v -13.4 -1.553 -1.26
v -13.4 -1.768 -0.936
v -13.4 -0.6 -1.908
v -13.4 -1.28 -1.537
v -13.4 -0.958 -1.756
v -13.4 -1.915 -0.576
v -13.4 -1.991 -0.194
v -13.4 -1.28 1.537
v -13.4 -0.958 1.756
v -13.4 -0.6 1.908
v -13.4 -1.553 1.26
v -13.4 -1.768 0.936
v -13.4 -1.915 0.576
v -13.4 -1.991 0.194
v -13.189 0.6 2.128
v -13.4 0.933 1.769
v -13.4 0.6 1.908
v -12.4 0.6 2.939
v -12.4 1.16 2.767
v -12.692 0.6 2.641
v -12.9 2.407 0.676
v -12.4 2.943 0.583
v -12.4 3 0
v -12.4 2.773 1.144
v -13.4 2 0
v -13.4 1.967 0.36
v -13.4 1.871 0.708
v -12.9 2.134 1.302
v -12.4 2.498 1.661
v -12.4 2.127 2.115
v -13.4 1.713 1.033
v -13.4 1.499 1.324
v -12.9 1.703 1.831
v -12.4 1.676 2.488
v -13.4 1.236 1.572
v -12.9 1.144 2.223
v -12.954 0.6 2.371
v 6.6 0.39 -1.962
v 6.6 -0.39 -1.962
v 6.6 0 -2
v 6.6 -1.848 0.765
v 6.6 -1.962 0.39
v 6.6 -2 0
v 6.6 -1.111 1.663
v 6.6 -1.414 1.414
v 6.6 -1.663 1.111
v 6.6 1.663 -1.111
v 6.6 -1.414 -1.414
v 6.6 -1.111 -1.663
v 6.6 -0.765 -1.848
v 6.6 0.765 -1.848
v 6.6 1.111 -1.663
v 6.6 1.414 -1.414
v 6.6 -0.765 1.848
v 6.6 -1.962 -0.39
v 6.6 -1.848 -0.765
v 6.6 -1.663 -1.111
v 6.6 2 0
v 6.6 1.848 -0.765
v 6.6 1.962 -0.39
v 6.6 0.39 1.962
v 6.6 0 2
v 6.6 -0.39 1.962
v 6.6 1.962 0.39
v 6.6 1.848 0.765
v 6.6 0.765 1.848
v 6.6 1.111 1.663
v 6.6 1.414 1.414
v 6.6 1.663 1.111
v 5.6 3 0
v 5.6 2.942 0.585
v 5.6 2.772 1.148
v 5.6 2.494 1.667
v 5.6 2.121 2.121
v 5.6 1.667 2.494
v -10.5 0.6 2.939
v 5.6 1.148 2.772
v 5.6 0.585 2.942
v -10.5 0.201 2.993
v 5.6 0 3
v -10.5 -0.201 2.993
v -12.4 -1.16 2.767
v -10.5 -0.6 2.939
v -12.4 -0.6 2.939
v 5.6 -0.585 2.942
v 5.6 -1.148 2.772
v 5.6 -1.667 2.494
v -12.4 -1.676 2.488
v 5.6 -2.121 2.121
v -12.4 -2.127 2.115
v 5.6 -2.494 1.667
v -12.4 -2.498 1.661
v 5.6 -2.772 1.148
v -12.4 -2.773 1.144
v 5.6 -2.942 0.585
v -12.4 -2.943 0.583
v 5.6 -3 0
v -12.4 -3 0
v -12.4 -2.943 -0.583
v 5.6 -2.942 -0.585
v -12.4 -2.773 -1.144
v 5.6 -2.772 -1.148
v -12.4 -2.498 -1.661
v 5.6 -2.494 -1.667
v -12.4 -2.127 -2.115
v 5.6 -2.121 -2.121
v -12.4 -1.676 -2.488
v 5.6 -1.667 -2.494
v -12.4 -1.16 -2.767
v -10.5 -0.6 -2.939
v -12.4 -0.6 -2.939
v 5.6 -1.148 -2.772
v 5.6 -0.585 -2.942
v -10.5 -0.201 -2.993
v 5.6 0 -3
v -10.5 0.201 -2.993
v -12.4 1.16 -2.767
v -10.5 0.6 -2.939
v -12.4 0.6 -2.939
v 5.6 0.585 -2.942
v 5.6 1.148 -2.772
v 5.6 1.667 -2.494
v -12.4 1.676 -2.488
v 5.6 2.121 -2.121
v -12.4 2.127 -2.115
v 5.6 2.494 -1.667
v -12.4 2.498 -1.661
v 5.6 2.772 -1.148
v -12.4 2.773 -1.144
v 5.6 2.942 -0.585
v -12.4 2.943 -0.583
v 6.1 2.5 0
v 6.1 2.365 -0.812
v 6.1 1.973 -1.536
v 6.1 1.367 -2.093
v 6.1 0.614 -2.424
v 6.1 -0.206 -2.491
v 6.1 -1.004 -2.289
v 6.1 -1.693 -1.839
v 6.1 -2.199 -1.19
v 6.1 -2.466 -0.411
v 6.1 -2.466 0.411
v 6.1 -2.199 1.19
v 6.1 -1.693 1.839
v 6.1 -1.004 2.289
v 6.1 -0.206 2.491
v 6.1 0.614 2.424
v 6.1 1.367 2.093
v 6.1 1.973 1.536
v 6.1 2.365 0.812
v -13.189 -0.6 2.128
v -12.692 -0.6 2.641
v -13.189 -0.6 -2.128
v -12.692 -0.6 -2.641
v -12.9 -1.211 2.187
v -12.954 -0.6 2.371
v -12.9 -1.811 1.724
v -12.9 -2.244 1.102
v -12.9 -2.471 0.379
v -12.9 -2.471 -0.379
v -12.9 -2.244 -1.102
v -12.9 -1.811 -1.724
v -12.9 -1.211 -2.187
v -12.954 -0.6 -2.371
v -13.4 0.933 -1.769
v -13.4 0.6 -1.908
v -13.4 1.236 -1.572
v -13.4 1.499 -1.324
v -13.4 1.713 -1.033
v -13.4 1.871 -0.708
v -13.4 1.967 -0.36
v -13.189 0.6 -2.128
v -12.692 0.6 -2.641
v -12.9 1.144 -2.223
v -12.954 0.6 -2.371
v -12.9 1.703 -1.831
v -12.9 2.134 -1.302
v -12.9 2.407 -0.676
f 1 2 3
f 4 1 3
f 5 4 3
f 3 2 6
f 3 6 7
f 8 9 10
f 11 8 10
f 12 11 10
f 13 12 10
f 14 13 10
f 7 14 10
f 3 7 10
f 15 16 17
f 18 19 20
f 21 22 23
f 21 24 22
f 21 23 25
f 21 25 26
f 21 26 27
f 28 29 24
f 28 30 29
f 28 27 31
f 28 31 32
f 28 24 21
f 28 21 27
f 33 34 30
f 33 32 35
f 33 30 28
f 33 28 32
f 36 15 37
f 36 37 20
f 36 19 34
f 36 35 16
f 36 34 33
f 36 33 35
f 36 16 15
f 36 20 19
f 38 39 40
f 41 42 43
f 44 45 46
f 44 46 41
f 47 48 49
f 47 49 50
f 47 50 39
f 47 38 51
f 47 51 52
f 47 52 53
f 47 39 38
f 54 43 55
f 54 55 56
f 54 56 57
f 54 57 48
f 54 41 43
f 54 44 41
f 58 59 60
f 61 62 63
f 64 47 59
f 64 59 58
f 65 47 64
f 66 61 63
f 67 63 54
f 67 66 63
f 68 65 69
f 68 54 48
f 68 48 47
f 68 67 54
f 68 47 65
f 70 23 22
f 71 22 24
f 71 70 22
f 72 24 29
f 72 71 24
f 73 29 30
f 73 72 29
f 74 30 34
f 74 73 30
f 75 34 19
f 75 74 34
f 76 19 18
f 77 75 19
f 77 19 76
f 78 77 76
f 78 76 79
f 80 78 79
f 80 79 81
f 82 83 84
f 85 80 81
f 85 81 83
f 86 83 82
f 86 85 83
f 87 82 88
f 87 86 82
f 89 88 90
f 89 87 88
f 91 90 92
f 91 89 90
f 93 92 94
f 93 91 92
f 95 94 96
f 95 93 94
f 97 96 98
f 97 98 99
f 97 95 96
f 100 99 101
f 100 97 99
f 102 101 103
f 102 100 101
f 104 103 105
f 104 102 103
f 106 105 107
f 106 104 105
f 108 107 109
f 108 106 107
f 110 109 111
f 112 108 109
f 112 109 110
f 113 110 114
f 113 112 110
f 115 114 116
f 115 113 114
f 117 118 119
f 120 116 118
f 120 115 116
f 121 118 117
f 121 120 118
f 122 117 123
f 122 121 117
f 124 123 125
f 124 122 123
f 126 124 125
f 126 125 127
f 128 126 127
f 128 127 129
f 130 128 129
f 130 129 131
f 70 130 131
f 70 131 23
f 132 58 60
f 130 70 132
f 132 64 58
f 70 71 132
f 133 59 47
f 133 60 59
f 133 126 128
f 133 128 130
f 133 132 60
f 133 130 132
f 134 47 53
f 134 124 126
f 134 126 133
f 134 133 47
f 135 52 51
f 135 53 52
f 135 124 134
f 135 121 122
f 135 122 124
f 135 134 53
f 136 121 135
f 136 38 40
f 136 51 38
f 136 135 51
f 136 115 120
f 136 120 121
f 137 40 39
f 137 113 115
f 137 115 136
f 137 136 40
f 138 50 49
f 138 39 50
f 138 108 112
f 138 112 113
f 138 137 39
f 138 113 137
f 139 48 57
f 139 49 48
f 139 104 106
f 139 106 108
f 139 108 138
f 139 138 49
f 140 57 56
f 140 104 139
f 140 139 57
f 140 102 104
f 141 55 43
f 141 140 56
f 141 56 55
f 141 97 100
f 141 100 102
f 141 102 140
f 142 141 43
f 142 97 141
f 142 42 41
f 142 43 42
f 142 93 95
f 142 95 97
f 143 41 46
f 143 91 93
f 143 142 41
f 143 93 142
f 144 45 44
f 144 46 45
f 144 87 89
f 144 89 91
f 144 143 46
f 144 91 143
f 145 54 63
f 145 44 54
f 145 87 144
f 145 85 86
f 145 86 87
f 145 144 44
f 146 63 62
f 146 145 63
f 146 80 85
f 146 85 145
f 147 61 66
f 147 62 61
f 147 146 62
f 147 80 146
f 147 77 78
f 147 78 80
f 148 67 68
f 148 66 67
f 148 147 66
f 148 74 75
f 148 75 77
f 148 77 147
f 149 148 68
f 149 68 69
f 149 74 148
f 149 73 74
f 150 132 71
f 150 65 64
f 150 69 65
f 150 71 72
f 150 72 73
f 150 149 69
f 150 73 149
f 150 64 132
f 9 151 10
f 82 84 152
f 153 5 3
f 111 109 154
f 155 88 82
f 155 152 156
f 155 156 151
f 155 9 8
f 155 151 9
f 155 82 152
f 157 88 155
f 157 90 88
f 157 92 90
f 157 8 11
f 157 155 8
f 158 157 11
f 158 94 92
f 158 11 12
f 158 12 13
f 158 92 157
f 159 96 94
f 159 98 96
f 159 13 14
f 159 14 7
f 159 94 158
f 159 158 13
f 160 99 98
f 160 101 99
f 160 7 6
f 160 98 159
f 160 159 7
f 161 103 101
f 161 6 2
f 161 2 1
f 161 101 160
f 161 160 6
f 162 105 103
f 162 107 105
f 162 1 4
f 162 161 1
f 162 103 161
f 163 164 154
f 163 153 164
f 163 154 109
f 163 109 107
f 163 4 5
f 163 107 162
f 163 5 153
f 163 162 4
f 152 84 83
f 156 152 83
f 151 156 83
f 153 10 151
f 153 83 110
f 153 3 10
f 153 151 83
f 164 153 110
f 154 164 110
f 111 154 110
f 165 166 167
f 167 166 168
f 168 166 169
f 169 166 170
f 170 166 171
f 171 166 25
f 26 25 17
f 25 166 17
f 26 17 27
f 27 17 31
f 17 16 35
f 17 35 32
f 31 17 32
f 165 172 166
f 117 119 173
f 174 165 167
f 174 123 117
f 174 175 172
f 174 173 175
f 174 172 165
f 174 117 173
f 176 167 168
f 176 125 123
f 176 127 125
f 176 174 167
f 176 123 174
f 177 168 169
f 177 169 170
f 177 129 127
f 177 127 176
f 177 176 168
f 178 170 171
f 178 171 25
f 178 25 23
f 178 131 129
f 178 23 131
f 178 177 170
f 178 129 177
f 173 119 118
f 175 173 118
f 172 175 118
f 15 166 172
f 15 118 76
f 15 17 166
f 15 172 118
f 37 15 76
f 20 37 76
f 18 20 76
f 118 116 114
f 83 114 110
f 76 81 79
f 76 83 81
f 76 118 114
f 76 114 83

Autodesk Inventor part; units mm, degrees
ref_plane "YZ Plane" through (0, 0, 0) normal (1, 0, 0) x (0, 1, 0)
ref_plane "XZ Plane" through (0, 0, 0) normal (0, 1, 0) x (-1, 0, 0)
sketch "Sketch1" plane through (0, 0, 0) normal (0, 0, 1) x (1, 0, 0)
  line L0 (0, 6.25) -> (0, -4.9479) construction
  line L1 (-13.4, 0) -> (-13.4, 3)
  line L2 (-13.4, 3) -> (6.6, 3)
  line L3 (6.6, 3) -> (6.6, 0)
  line L4 (-13.4, 0) -> (6.6, 0)
  line L5 (-17.4, 0) -> (10.6, 0) projected
  line L6 (0, 8.4896) -> (0, -7.1875) projected
  dimension "d0" = 6
  dimension "d1" = 6.6
  dimension "d2" = 20
revolve "Body" add sketch "Sketch1" angle 360 about axis through (-13.4, 0, 0) along (1, 0, 0)
sketch "Sketch2" plane through (-13.4, 0, 0) normal (-1, 0, 0) x (0, 0, 1)
  line L0 (0, -4.2) -> (0, 4.2) projected
  line L1 (-4.2, 0) -> (4.2, 0) projected
  line L2 (-3, 0.6) -> (3, 0.6)
  line L3 (3, 0.6) -> (3, -0.6)
  line L4 (3, -0.6) -> (-3, -0.6)
  line L5 (-3, -0.6) -> (-3, 0.6)
  line L6 (-3, 0) -> (3, 0) construction
  line L7 (0, 0.6) -> (0, -0.6) construction
  circle A0 centre (0, 0) radius 3 projected
  dimension "d10" = 1.2
extrude "Slot" cut sketch "Sketch2" against normal blind 2.9 contours L4 A0 L1 L0 | L0 L1 A0 L4 | L4 L5 A0 | A0 L3 L4 | L1 A0 L2 L0 | L0 L2 A0 L1 | L5 L2 A0 | A0 L2 L3
chamfer "Chamfer1" distance 1 angle 45 3 edges at (-13.4, 2.3238, 1.8974) (-13.4, 2.3238, -1.8974) (-13.4, -3, 0) measured on face at (-6.7333, -3, 0)
thread "Thread" size "M6x1" designation "M6" class "6g" standard "GB Metric profile" length 6.6
chamfer "Chamfer2" distance 1 angle 45 1 edges at (6.6, -3, 0) measured on face at (-6.0667, -3, 0)
ref_plane "Work Plane3" through (-3.4, 0, 0) normal (0, 0, -1) x (1, 0, 0)
equation "\"d10\" = SBR"
equation "\"d11\" = STI"
equation "\"d4\" = PHH"
equation "\"d5\" = FAWI"
equation "\"d27\" = PHH"
equation "\"d6\" = GEL"
equation "\"d8\" = PHH"
equation "\"d9\" = FAWI"
equation "\"d0\" = NND"
equation "\"d1\" = GEL"
equation "\"d2\" = NLG"
equation "\"NND\" = 6"
equation "\"NLG\" = 20"
equation "\"PHH\" = 1"
equation "\"STI\" = 2.9"
equation "\"SBR\" = 1.2"
equation "\"GEL\" = 6.6"
equation "\"GD1\" = THREADDIA - 1.2269 * PTC"
equation "\"FAWI\" = 45deg"
equation "\"d14\" = -GEL"
equation "\"GUL\" = 0.61345 * PTC"
equation "\"THREADDIA\" = 6"
equation "\"TOA\" = 30deg"
equation "\"PTC\" = 1"
equation "\"GAL\" = 0.61345 * PTC"
properties part number "Pin GB 878-86 6 x 20" material "Steel, Mild"
